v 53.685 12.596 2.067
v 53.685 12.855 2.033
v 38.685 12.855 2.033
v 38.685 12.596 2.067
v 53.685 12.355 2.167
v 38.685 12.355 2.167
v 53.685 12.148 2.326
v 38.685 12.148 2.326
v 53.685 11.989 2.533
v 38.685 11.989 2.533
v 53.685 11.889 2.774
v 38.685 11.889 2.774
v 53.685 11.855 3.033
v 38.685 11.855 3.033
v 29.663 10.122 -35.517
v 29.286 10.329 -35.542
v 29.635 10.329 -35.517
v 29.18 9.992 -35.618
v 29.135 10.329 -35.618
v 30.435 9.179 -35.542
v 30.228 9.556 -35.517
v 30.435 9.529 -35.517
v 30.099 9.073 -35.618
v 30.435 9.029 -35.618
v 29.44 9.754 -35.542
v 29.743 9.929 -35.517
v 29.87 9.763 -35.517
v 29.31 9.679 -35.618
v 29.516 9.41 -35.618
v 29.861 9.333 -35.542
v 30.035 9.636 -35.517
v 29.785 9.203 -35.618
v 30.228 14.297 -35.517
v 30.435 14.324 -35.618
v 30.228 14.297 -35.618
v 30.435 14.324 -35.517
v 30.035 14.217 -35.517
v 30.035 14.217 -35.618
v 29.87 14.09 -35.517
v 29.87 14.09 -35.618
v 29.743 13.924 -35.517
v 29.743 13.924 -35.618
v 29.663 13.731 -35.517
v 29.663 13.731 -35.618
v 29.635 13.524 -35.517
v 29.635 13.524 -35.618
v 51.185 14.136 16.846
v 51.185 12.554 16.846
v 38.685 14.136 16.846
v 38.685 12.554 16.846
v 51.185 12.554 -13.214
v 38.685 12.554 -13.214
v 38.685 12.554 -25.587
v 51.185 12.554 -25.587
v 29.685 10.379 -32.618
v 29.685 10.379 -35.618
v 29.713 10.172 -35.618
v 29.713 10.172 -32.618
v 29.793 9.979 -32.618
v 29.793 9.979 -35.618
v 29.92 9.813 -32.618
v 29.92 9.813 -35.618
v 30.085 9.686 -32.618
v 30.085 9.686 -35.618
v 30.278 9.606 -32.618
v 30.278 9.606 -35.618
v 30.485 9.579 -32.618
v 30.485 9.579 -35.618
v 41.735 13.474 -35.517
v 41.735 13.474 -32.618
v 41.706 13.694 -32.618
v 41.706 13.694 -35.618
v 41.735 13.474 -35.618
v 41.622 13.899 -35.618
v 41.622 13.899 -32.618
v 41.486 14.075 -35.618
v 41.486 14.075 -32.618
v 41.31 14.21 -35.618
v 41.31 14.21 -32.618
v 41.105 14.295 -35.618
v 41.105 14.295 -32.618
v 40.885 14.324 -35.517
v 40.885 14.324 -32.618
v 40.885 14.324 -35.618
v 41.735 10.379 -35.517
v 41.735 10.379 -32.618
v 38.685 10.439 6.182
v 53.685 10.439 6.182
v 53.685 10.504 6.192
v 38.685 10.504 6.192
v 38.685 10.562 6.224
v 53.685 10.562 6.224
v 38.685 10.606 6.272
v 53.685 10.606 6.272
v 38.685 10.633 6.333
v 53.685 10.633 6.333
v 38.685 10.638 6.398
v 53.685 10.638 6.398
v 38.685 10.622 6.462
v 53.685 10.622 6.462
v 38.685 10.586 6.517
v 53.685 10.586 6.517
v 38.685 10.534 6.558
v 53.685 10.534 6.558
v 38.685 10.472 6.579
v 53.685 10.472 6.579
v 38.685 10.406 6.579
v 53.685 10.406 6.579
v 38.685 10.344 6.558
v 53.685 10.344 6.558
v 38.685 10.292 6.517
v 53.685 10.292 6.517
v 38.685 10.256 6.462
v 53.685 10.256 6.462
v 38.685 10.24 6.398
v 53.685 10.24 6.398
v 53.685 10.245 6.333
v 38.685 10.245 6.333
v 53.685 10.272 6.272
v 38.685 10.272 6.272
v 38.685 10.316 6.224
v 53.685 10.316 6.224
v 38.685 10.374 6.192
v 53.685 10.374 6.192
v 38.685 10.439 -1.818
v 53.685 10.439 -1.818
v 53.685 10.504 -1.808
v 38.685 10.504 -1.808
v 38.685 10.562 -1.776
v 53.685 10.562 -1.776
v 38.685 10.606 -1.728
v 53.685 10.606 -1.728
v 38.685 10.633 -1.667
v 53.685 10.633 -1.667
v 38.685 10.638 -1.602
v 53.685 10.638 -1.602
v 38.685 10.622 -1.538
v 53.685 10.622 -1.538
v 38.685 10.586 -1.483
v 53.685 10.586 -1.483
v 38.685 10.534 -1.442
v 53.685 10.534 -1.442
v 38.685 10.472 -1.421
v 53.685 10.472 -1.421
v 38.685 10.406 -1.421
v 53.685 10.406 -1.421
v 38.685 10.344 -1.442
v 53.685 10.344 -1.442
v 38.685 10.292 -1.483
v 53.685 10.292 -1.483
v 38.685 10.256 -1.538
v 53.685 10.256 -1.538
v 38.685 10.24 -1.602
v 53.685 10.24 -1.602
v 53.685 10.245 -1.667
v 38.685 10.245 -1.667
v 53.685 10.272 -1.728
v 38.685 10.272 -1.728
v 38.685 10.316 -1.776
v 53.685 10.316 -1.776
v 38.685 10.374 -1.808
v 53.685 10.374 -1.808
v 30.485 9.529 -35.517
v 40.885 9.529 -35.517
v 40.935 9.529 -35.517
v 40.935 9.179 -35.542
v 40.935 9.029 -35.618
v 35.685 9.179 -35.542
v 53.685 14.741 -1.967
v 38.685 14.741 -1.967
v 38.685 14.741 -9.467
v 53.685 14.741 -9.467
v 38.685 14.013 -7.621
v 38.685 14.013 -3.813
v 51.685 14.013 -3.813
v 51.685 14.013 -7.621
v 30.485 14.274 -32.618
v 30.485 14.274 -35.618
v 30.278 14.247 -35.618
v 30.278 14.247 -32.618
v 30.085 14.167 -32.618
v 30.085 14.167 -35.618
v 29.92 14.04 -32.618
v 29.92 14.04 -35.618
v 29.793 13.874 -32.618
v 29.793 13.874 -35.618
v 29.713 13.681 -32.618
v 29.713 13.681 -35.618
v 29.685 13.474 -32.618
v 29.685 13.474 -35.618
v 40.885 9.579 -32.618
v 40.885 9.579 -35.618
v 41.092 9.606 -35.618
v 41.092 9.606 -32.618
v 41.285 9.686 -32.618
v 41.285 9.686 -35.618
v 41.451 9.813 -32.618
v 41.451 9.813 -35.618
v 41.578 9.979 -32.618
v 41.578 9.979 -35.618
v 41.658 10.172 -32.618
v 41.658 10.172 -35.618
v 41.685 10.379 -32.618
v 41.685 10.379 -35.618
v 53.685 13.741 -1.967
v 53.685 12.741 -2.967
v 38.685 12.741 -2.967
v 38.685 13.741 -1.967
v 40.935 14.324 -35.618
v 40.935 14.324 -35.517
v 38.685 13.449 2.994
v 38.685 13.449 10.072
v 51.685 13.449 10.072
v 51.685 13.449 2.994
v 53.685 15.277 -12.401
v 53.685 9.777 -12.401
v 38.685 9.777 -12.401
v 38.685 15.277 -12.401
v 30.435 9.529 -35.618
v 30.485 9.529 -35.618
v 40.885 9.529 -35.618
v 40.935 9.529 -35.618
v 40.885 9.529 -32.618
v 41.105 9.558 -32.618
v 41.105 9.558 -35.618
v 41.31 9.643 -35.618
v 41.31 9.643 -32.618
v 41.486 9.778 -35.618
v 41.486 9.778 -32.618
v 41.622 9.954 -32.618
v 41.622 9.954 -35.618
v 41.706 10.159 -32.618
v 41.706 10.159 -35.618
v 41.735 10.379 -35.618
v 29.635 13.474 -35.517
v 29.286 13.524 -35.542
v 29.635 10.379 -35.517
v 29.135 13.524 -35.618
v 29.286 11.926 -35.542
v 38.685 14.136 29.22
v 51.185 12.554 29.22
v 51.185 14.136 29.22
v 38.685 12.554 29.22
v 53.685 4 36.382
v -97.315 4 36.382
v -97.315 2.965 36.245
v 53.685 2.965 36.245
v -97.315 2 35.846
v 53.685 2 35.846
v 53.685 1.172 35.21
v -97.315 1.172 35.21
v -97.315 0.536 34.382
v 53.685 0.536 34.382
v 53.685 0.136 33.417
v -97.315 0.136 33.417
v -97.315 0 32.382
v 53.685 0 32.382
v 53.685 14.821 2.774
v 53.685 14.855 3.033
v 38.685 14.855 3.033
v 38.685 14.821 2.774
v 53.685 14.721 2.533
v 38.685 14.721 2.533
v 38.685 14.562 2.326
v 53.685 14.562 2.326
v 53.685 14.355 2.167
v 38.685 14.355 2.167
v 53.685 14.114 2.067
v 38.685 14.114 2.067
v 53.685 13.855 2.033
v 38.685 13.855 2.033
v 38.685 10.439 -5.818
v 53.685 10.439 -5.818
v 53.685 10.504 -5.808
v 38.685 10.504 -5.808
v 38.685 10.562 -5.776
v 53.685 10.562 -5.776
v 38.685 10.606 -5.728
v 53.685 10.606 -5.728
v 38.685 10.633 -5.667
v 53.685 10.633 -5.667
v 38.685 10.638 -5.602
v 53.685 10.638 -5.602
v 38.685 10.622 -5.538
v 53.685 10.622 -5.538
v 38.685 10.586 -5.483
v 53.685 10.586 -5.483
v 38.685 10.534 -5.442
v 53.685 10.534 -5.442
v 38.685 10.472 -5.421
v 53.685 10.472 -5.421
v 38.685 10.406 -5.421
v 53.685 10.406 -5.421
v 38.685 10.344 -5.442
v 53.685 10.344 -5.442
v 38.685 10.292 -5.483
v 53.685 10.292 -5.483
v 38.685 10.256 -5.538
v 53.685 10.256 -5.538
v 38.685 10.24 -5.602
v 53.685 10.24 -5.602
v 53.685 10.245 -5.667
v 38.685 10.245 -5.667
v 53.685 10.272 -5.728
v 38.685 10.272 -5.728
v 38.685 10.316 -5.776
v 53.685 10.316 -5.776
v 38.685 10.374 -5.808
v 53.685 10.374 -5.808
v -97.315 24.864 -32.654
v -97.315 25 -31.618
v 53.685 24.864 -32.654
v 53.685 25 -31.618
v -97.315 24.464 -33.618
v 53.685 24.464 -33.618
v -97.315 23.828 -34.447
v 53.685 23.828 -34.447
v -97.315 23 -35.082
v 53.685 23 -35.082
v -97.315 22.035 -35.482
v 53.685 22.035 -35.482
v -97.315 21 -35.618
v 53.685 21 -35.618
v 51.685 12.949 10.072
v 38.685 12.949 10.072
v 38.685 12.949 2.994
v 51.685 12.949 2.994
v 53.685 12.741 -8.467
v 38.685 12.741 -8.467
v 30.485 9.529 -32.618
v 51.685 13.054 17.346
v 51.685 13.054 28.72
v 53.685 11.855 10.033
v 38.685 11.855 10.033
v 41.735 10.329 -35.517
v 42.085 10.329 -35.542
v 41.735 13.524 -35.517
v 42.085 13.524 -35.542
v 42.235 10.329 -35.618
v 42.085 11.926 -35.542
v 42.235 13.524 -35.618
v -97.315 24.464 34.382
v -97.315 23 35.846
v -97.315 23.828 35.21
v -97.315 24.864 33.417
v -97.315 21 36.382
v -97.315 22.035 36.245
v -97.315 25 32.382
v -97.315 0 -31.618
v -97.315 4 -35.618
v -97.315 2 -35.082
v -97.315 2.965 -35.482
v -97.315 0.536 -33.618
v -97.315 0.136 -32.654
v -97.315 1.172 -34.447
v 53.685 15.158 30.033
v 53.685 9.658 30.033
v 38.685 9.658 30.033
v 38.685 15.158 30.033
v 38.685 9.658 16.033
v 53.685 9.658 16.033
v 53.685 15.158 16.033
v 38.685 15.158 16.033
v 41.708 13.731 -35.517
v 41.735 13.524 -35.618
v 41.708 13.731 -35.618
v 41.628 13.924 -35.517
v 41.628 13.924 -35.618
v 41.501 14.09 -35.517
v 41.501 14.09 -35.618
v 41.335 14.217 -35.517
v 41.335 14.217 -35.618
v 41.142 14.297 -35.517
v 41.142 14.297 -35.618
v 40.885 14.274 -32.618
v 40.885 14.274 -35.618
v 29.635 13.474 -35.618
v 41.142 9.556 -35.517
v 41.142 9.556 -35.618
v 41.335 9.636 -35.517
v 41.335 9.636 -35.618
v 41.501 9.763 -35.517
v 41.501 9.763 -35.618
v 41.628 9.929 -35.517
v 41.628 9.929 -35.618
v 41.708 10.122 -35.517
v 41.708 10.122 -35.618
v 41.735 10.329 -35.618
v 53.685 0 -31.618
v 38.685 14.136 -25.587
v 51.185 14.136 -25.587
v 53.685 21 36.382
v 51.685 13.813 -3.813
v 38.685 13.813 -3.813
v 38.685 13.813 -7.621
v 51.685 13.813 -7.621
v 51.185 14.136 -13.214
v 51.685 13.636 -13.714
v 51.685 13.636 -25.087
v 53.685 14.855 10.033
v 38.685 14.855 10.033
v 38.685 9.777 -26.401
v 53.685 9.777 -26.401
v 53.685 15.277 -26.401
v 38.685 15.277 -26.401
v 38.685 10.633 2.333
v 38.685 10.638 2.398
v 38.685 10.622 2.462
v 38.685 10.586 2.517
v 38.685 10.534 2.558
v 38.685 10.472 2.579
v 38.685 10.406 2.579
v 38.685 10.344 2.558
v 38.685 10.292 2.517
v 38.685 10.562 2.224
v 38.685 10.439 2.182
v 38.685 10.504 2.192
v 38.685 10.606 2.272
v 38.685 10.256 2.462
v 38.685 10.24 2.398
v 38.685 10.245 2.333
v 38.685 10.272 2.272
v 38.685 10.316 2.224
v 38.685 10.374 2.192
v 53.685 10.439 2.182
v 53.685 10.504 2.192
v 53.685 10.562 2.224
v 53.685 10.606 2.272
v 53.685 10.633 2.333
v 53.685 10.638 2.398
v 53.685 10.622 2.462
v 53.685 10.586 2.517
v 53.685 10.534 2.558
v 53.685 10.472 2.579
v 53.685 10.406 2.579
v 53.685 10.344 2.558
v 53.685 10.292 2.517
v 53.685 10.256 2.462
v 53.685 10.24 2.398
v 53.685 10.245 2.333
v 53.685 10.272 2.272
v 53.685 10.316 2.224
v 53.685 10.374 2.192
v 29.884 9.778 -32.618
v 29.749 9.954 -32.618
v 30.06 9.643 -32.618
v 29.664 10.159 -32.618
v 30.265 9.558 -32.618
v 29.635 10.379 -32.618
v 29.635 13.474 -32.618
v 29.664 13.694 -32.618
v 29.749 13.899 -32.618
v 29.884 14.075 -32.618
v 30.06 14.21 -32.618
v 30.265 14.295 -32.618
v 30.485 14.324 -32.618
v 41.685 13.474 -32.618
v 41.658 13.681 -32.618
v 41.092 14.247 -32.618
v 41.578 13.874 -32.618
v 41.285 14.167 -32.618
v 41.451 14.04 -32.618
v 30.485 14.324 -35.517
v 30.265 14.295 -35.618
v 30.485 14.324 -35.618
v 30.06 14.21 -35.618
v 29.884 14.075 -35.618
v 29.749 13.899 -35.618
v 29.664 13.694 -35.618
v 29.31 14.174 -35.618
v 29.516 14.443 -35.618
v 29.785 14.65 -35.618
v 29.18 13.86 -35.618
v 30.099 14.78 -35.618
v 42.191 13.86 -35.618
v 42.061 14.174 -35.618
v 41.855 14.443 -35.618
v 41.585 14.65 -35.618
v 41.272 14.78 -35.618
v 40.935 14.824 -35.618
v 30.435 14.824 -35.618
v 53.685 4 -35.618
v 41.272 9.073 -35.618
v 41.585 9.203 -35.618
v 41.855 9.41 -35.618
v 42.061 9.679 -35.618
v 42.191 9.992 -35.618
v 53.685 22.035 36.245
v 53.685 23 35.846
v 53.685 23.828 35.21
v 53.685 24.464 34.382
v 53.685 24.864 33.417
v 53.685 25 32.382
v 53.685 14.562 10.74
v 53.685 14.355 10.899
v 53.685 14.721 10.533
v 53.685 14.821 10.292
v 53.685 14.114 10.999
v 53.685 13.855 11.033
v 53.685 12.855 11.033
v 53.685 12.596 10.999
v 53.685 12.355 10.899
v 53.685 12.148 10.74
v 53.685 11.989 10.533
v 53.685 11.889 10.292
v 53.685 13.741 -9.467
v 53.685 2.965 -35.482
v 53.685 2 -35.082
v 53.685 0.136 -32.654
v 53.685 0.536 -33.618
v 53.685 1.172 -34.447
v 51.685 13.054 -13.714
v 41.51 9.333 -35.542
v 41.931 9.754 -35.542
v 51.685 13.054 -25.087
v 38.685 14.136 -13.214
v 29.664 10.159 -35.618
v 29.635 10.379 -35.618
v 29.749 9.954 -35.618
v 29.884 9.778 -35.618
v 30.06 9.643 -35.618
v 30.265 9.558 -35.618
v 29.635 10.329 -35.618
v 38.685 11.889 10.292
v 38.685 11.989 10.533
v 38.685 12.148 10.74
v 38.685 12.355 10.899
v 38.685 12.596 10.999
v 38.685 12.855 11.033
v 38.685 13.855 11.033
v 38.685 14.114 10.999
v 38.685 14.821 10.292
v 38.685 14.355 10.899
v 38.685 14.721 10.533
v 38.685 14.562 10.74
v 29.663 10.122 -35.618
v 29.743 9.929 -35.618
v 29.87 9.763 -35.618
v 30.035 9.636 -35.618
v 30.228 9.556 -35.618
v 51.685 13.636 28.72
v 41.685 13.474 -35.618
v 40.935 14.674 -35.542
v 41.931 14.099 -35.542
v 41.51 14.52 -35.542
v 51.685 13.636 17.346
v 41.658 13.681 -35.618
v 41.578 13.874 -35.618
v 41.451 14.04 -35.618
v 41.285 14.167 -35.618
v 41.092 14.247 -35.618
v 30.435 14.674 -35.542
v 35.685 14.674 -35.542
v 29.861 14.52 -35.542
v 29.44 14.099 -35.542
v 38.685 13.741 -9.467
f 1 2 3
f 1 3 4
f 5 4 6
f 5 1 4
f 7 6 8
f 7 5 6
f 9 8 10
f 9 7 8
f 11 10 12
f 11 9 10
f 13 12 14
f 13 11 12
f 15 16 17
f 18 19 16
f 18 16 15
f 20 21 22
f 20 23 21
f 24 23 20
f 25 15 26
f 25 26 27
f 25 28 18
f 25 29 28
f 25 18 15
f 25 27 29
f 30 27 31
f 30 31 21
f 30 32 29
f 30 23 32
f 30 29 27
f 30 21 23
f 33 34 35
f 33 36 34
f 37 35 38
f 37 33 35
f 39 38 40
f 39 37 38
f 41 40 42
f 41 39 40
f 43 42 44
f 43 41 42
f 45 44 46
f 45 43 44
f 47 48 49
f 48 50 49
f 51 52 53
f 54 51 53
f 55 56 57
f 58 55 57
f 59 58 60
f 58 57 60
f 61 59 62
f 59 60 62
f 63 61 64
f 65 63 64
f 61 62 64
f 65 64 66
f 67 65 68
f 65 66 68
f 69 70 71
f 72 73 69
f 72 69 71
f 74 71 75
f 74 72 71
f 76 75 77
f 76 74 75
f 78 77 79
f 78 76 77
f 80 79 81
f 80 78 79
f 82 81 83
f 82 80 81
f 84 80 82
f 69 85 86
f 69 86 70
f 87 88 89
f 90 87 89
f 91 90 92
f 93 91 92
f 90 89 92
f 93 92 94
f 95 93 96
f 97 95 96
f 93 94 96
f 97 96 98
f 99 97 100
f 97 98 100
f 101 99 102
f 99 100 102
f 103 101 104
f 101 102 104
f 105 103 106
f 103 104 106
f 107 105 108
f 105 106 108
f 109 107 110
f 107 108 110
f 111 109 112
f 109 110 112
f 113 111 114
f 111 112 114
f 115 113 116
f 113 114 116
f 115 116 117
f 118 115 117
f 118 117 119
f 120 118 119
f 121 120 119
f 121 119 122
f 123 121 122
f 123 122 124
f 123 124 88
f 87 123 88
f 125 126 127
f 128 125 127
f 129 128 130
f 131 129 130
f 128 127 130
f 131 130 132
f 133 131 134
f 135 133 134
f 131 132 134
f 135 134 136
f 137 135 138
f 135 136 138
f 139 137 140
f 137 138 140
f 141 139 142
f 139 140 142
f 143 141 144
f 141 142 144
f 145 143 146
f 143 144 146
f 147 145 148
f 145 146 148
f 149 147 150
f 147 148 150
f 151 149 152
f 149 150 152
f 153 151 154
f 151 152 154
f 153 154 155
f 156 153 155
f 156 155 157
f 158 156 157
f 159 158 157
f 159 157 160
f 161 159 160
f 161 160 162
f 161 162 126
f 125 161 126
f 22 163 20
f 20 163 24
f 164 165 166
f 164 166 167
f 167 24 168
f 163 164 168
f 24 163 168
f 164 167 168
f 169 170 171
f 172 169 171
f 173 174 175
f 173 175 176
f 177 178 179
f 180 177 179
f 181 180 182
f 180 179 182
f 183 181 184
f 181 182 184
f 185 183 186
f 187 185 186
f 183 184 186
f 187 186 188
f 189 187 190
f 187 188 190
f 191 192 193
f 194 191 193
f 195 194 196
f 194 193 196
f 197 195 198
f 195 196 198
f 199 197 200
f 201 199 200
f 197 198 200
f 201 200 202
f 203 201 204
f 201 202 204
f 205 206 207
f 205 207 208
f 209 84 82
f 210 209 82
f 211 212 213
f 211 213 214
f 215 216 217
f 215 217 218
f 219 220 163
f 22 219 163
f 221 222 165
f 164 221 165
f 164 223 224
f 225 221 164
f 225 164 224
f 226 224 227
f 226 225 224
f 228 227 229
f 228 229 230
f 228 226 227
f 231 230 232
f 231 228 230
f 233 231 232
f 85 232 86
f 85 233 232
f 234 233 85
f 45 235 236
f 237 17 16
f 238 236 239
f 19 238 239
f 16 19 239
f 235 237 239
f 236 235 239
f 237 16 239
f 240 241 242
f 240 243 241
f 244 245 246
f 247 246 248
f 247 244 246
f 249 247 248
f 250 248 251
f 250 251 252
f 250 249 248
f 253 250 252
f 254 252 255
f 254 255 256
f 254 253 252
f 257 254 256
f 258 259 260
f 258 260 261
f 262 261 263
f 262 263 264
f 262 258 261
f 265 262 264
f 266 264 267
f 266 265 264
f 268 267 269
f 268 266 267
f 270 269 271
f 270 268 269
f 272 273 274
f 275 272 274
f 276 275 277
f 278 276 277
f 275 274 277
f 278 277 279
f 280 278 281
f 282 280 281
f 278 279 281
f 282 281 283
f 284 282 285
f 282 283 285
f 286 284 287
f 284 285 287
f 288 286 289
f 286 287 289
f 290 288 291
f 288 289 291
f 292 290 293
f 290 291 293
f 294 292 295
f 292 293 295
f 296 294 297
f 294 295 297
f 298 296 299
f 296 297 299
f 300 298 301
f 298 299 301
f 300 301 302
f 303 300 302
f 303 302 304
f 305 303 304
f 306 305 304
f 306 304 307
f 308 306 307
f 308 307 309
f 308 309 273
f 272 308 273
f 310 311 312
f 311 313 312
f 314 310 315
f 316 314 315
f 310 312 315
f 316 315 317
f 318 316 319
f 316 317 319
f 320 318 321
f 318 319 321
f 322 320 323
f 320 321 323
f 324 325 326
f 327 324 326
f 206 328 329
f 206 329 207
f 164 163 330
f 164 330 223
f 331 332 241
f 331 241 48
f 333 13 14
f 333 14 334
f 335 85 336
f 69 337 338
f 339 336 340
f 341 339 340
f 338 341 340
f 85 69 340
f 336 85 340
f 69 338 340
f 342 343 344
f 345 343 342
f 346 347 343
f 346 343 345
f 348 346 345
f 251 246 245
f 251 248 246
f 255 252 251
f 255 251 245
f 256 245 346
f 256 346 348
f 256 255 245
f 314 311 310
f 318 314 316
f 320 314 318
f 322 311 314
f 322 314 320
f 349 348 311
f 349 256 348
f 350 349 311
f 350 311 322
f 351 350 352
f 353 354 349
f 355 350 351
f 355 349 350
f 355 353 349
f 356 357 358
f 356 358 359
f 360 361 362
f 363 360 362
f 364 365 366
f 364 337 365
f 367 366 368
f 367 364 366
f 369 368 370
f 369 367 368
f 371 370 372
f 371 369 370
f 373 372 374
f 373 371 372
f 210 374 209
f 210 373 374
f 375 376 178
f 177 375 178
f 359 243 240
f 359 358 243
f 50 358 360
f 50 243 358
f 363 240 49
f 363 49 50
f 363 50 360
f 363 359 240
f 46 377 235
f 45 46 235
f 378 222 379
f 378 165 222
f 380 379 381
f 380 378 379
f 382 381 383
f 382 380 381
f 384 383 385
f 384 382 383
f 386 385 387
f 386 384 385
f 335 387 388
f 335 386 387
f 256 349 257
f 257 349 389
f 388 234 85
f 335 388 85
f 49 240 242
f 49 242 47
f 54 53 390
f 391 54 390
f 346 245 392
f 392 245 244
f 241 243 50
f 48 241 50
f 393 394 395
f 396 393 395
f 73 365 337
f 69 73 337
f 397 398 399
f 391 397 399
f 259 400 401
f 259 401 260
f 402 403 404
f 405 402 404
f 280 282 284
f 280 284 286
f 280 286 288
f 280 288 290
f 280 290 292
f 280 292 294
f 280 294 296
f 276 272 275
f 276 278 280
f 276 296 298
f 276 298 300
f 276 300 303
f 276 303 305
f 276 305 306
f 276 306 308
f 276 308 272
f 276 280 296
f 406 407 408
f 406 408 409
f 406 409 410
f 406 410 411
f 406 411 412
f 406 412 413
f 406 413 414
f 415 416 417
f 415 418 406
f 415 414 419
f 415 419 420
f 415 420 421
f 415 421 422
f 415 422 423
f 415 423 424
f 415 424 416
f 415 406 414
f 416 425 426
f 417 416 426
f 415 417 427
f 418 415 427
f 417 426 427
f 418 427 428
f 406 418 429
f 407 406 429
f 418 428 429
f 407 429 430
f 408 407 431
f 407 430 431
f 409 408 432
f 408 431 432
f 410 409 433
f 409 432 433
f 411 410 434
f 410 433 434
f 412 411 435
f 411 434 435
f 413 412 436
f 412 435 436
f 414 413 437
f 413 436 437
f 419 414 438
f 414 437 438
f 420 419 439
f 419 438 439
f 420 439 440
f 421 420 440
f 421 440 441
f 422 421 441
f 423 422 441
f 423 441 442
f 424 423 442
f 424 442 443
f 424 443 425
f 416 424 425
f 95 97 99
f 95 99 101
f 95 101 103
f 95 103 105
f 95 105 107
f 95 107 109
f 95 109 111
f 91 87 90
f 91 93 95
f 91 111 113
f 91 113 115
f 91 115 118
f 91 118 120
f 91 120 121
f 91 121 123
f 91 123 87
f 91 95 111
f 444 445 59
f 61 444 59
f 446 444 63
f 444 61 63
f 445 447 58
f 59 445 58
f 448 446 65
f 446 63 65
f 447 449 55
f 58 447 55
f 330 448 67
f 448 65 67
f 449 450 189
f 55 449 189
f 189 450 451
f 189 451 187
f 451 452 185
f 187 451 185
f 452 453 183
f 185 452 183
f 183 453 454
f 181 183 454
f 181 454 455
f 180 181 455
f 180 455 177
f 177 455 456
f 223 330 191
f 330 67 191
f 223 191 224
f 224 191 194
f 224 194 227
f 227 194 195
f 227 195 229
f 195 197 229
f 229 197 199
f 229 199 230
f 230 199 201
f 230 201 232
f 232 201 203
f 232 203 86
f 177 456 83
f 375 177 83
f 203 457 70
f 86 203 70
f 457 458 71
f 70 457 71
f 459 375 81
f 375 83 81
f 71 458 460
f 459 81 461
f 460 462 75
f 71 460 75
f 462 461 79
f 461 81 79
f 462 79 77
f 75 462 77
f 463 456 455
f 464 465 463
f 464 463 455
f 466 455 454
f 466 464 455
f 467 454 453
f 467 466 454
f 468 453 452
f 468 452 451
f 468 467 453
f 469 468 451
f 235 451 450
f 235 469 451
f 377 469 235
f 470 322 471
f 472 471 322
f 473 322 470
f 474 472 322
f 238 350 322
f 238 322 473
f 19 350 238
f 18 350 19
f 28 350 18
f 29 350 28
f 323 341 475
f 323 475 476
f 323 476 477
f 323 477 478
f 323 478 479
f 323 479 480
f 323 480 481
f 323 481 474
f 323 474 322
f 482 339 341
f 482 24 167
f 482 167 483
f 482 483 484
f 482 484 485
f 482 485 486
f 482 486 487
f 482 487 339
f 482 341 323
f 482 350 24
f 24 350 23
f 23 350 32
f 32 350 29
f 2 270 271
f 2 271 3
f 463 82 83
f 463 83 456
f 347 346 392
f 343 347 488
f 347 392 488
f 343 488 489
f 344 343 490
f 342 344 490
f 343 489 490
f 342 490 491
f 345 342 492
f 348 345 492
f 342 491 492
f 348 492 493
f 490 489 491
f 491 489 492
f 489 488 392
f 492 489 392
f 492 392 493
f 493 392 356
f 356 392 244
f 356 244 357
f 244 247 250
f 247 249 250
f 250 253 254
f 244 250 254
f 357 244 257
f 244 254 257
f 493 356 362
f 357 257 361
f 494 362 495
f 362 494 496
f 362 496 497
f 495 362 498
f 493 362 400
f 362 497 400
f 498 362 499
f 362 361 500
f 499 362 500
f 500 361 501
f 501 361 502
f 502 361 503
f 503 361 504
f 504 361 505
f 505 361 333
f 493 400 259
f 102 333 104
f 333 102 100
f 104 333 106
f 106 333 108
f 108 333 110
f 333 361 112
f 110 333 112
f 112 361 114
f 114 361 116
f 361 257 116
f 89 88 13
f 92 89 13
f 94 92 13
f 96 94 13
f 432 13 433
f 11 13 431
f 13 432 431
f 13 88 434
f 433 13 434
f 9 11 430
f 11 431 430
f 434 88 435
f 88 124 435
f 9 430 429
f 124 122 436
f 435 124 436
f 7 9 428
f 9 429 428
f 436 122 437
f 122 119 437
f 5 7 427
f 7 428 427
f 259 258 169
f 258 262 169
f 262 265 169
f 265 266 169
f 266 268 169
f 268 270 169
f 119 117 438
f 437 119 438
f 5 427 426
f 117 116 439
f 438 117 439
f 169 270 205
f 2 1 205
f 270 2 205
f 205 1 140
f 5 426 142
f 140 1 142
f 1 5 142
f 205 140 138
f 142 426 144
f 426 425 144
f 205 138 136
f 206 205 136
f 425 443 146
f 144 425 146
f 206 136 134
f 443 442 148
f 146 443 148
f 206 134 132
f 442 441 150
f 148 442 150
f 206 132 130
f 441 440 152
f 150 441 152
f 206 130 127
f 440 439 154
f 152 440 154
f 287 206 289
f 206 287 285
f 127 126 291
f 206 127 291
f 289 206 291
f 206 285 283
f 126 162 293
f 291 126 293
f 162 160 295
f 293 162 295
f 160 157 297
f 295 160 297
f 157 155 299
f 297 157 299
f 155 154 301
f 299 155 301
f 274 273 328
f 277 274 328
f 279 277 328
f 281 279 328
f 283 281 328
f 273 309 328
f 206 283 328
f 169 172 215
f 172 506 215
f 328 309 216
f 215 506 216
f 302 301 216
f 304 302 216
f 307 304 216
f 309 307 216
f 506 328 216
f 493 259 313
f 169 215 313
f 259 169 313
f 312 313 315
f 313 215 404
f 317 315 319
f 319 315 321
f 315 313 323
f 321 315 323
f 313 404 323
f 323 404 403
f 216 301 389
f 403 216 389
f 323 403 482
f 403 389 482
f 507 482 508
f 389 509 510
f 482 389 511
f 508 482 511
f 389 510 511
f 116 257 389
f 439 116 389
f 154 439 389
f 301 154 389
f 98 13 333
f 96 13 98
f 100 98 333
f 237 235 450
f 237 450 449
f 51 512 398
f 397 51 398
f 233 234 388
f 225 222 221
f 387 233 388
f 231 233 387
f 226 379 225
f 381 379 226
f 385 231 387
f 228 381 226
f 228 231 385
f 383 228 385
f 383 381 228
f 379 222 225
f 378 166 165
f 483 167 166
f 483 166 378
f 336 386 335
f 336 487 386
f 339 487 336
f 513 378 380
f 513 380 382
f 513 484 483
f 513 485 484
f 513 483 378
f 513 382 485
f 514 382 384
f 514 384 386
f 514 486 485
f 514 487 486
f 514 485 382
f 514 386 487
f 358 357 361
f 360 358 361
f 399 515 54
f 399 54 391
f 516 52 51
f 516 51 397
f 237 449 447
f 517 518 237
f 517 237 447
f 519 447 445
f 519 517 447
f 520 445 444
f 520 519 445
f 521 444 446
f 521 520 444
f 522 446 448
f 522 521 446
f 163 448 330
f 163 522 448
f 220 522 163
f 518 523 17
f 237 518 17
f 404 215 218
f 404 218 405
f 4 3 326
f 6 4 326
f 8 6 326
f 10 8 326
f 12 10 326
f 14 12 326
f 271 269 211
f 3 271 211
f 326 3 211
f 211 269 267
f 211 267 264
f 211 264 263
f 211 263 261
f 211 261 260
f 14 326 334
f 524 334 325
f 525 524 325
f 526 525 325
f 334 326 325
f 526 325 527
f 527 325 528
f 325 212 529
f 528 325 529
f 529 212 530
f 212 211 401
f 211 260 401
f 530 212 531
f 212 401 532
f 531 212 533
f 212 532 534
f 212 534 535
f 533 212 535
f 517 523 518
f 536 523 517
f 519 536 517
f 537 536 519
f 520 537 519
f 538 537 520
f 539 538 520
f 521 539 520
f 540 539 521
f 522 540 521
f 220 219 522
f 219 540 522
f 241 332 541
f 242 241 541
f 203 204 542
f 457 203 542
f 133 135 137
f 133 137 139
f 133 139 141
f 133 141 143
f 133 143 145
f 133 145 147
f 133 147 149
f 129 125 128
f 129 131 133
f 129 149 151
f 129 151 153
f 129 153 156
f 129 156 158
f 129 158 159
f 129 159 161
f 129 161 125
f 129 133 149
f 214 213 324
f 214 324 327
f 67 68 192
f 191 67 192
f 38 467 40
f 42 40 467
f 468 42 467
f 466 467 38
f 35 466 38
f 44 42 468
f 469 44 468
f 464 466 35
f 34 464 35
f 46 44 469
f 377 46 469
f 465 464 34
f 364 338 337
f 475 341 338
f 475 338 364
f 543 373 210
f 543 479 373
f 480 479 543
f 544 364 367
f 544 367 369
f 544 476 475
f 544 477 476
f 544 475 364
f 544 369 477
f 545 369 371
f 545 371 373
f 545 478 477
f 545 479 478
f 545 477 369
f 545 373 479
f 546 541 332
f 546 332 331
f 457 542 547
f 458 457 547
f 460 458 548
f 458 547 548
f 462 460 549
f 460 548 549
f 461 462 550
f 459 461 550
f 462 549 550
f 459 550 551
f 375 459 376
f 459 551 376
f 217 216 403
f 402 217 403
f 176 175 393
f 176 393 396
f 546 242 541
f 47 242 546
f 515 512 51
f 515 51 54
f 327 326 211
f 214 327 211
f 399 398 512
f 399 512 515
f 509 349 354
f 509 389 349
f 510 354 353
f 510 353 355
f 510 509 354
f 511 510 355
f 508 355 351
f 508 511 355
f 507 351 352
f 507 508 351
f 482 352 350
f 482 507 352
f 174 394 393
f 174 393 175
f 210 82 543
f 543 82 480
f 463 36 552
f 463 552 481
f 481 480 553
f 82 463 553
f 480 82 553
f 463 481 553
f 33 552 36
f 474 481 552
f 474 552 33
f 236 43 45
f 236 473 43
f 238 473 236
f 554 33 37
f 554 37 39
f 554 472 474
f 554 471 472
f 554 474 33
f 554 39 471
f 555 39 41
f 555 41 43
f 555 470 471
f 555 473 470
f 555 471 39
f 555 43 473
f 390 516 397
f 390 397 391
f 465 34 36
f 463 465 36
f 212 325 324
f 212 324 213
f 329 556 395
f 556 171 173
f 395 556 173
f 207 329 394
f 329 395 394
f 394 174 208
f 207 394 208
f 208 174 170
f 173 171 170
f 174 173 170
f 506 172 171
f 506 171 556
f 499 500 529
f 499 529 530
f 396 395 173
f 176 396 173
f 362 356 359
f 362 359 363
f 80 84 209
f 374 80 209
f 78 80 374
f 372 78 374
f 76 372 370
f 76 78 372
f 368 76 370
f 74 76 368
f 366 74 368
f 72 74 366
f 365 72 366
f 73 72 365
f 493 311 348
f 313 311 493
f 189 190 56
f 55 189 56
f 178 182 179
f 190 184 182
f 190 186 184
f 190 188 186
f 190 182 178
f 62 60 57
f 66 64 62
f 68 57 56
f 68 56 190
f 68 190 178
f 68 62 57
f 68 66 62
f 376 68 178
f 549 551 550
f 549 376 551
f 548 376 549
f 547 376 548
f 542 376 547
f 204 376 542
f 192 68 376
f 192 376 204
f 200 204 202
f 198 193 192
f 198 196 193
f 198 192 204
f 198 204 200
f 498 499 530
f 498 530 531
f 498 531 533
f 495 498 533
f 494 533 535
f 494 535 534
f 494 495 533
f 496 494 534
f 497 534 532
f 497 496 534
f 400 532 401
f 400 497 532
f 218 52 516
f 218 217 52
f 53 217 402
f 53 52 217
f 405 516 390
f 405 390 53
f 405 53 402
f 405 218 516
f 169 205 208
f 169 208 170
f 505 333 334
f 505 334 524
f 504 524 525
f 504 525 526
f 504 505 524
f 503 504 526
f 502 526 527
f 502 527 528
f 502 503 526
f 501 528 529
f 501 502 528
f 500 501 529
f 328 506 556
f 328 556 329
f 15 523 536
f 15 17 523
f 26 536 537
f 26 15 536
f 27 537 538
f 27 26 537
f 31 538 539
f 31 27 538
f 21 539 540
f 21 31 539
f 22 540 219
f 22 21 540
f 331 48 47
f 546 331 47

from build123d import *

# Parameters (mm, degrees)
SKETCH_1_W          = 151
SKETCH_1_H          = 72
EXTRUDE_1_DEPTH     = 25
FILLET_1_R          = 4
FILLET_2_R          = 4
FILLET_3_R          = 4
FILLET_4_R          = 4
SKETCH_2_R          = 0.2
SKETCH_2_W          = 14
SKETCH_2_H          = 5.5
CUT_EXTRUDE_1_DEPTH = 15
SKETCH_3_W          = 12.373268072
SKETCH_3_H          = 1.582389444
SKETCH_3_W_2        = 7.077543374
SKETCH_3_H_2        = 0.5
SKETCH_3_W_3        = 3.808702178
SKETCH_3_H_3        = 0.2
EXTRUDE_2_DEPTH     = 13
CHAMFER_1_SIZE      = 0.5
CHAMFER_2_SIZE      = 0.5
CHAMFER_3_SIZE      = 0.5
CHAMFER_4_SIZE      = 0.5
CHAMFER_5_SIZE      = 0.5
CUT_EXTRUDE_2_DEPTH = 3


with BuildPart() as part:
    # 草图1 → 凸台-拉伸1 (new body)
    with BuildSketch(Plane(origin=(0, 0, 0), x_dir=(1, 0, 0), z_dir=(0, 1, 0))):
        with Locations((-21.814590862, -0.38165894)):
            Rectangle(SKETCH_1_W, SKETCH_1_H)
    extrude(amount=EXTRUDE_1_DEPTH)

    # 圆角1
    fillet_1_edges = [part.edges().sort_by_distance(p)[0] for p in [
        (-21.814590862, 25, 36.38165894),
    ]]
    fillet(fillet_1_edges, radius=FILLET_1_R)

    # 圆角2
    fillet_2_edges = [part.edges().sort_by_distance(p)[0] for p in [
        (-21.814590862, 25, -35.61834106),
    ]]
    fillet(fillet_2_edges, radius=FILLET_2_R)

    # 圆角3
    fillet_3_edges = [part.edges().sort_by_distance(p)[0] for p in [
        (-21.814590862, 0, 36.38165894),
    ]]
    fillet(fillet_3_edges, radius=FILLET_3_R)

    # 圆角4
    fillet_4_edges = [part.edges().sort_by_distance(p)[0] for p in [
        (-21.814590862, 0, -35.61834106),
    ]]
    fillet(fillet_4_edges, radius=FILLET_4_R)

    # 草图2 → 切除-拉伸1 (cut)
    with BuildSketch(Plane(origin=(53.685409138, 0, 0), x_dir=(0, 0, -1), z_dir=(1, 0, 0))):
        with Locations((-6.38165894, 10.438981293)):
            Circle(SKETCH_2_R)
        with Locations((-2.38165894, 10.438981293)):
            Circle(SKETCH_2_R)
        with Locations((1.61834106, 10.438981293)):
            Circle(SKETCH_2_R)
        with Locations((5.61834106, 10.438981293)):
            Circle(SKETCH_2_R)
        with Locations((-23.032936311, 12.408130846)):
            Rectangle(SKETCH_2_W, SKETCH_2_H)
        with BuildLine():
            Line((-10.032936311, 14.854810604), (-3.032936311, 14.854810604))
            ThreePointArc((-3.032936311, 14.854810604), (-2.32582953, 14.561917385), (-2.032936311, 13.854810604))
            Line((-2.032936311, 13.854810604), (-2.032936311, 12.854810604))
            ThreePointArc((-2.032936311, 12.854810604), (-2.32582953, 12.147703823), (-3.032936311, 11.854810604))
            Line((-3.032936311, 11.854810604), (-10.032936311, 11.854810604))
            ThreePointArc((-10.032936311, 11.854810604), (-10.740043093, 12.147703823), (-11.032936311, 12.854810604))
            Line((-11.032936311, 12.854810604), (-11.032936311, 13.854810604))
            ThreePointArc((-11.032936311, 13.854810604), (-10.740043093, 14.561917385), (-10.032936311, 14.854810604))
        make_face()
        Polygon((1.967063689, 14.74117963), (9.467063689, 14.74117963), (9.467063689, 13.74117963), (8.467063689, 12.74117963), (2.967063689, 12.74117963), (1.967063689, 13.74117963), align=None)
        with Locations((19.400712994, 12.527228442)):
            Rectangle(SKETCH_2_W, SKETCH_2_H)
    extrude(amount=-CUT_EXTRUDE_1_DEPTH, mode=Mode.SUBTRACT)

    # 草图3 → 凸台-拉伸2 (add)
    with BuildSketch(Plane(origin=(38.685409138, 0, 0), x_dir=(0, 0, -1), z_dir=(1, 0, 0))):
        with Locations((-23.032936311, 13.344739888)):
            Rectangle(SKETCH_3_W, SKETCH_3_H)
        with Locations((19.400712994, 13.344739888)):
            Rectangle(SKETCH_3_W, SKETCH_3_H)
        with Locations((-6.532936311, 13.198610031)):
            Rectangle(SKETCH_3_W_2, SKETCH_3_H_2)
        with Locations((5.717063689, 13.913029352)):
            Rectangle(SKETCH_3_W_3, SKETCH_3_H_3)
    extrude(amount=EXTRUDE_2_DEPTH)

    # 倒角1
    chamfer_1_edges = [part.edges().sort_by_distance(p)[0] for p in [
        (51.685409138, 12.553545166, 23.032936311),
    ]]
    chamfer(chamfer_1_edges, length=CHAMFER_1_SIZE)

    # 倒角2
    chamfer_2_edges = [part.edges().sort_by_distance(p)[0] for p in [
        (51.685409138, 14.13593461, 23.032936311),
    ]]
    chamfer(chamfer_2_edges, length=CHAMFER_2_SIZE)

    # 倒角3
    chamfer_3_edges = [part.edges().sort_by_distance(p)[0] for p in [
        (51.685409138, 13.344739888, 29.219570347),
    ]]
    chamfer(chamfer_3_edges, length=CHAMFER_3_SIZE)

    # 倒角4
    chamfer_4_edges = [part.edges().sort_by_distance(p)[0] for p in [
        (51.685409138, 13.344739888, 16.846302275),
    ]]
    chamfer(chamfer_4_edges, length=CHAMFER_4_SIZE)

    # 倒角5
    chamfer_5_edges = [part.edges().sort_by_distance(p)[0] for p in [
        (51.685409138, 13.344739888, -13.214078958),
        (51.685409138, 12.553545166, -19.400712994),
        (51.685409138, 13.344739888, -25.58734703),
        (51.685409138, 14.13593461, -19.400712994),
    ]]
    chamfer(chamfer_5_edges, length=CHAMFER_5_SIZE)

    # 草图4 → 切除-拉伸2 (cut)
    with BuildSketch(Plane(origin=(0, 0, -35.61834106), x_dir=(-1, 0, 0), z_dir=(0, 0, -1))):
        with BuildLine():
            Line((-40.885409138, 14.323868956), (-30.485409138, 14.323868956))
            ThreePointArc((-30.485409138, 14.323868956), (-29.884368374, 14.07490972), (-29.635409138, 13.473868956))
            Line((-29.635409138, 13.473868956), (-29.635409138, 10.378810207))
            ThreePointArc((-29.635409138, 10.378810207), (-29.884368374, 9.777769443), (-30.485409138, 9.528810207))
            Line((-30.485409138, 9.528810207), (-40.885409138, 9.528810207))
            ThreePointArc((-40.885409138, 9.528810207), (-41.486449902, 9.777769443), (-41.735409138, 10.378810207))
            Line((-41.735409138, 10.378810207), (-41.735409138, 13.473868956))
            ThreePointArc((-41.735409138, 13.473868956), (-41.486449902, 14.07490972), (-40.885409138, 14.323868956))
        make_face()
        with BuildLine():
            Line((-40.885409138, 14.273868956), (-30.485409138, 14.273868956))
            ThreePointArc((-30.485409138, 14.273868956), (-29.919723713, 14.03955438), (-29.685409138, 13.473868956))
            Line((-29.685409138, 13.473868956), (-29.685409138, 10.378810207))
            ThreePointArc((-29.685409138, 10.378810207), (-29.919723713, 9.813124782), (-30.485409138, 9.578810207))
            Line((-30.485409138, 9.578810207), (-40.885409138, 9.578810207))
            ThreePointArc((-40.885409138, 9.578810207), (-41.451094563, 9.813124782), (-41.685409138, 10.378810207))
            Line((-41.685409138, 10.378810207), (-41.685409138, 13.473868956))
            ThreePointArc((-41.685409138, 13.473868956), (-41.451094563, 14.03955438), (-40.885409138, 14.273868956))
        make_face(mode=Mode.SUBTRACT)
    extrude(amount=-CUT_EXTRUDE_2_DEPTH, mode=Mode.SUBTRACT)

    # 切除-扫描1: sweep along a path in 草图5
    with BuildLine(Plane(origin=(0, 0, -35.61834106), x_dir=(-1, 0, 0), z_dir=(0, 0, -1))) as sweep_1_path:
        Line((-40.935409138, 14.823868956), (-30.435409138, 14.823868956))
        ThreePointArc((-30.435409138, 14.823868956), (-29.516170322, 14.443107771), (-29.135409138, 13.523868956))
        Line((-29.135409138, 13.523868956), (-29.135409138, 10.328810207))
        ThreePointArc((-29.135409138, 10.328810207), (-29.516170322, 9.409571391), (-30.435409138, 9.028810207))
        Line((-30.435409138, 9.028810207), (-40.935409138, 9.028810207))
        ThreePointArc((-40.935409138, 9.028810207), (-41.854647953, 9.409571391), (-42.235409138, 10.328810207))
        Line((-42.235409138, 10.328810207), (-42.235409138, 13.523868956))
        ThreePointArc((-42.235409138, 13.523868956), (-41.854647953, 14.443107771), (-40.935409138, 14.823868956))
    # 草图6 → 切除-扫描1 (sweep, cut)
    with BuildSketch(Plane(origin=(0, 11, 0), x_dir=(1, 0, 0), z_dir=(0, 1, 0))):
        with BuildLine():
            Line((41.735409138, 35.51679266), (41.735409138, 35.61834106))
            Line((41.735409138, 35.61834106), (42.235409138, 35.61834106))
            add(Edge.make_bspline(
                [(42.235409138, 35.61834106), (42.184892706, 35.515744093), (41.735409138, 35.51679266)],
                knots=[0, 0, 0, 1, 1, 1], degree=2))
        make_face()
    sweep(path=sweep_1_path.line, mode=Mode.SUBTRACT)


solid = part.part
